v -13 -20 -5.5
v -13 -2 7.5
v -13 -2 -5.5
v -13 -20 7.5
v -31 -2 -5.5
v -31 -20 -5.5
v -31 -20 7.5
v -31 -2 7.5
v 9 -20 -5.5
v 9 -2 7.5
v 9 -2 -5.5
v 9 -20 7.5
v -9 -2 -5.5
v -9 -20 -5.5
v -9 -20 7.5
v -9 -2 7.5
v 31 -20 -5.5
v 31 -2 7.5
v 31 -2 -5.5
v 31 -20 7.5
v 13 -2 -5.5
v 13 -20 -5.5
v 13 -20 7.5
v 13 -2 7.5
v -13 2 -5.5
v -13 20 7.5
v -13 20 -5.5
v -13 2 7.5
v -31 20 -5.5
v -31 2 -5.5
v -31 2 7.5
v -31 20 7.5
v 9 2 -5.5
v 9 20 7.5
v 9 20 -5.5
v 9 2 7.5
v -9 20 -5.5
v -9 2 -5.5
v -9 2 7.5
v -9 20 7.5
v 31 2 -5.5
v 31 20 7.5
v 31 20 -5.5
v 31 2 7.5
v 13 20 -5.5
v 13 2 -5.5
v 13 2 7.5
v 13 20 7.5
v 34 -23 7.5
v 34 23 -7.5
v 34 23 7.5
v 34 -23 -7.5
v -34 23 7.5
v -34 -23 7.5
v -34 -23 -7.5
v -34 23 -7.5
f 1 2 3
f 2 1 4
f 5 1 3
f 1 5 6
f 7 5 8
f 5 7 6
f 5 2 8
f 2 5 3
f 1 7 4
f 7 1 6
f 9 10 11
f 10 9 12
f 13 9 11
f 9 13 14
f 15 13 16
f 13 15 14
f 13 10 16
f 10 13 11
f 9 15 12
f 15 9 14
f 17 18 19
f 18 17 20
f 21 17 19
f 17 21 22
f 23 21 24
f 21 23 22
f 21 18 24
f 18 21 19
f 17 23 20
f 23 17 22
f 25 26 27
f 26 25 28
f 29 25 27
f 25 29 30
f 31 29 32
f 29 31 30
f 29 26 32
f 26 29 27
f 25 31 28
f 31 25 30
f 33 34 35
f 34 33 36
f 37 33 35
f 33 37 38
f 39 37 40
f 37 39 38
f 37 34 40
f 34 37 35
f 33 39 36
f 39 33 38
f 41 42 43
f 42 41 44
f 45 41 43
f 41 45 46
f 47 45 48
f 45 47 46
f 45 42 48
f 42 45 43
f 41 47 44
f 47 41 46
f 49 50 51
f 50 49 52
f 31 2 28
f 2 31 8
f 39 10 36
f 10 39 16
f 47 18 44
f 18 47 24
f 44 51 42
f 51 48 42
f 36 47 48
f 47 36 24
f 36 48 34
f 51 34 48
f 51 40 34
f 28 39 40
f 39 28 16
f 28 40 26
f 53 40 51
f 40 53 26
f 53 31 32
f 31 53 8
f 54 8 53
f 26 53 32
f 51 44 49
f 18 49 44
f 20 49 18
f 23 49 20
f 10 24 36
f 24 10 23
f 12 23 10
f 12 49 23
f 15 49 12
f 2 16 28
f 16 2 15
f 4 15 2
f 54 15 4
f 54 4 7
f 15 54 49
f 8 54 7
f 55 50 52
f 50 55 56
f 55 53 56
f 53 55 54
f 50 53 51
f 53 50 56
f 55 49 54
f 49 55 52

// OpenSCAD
$fn = 32;

// ----------------------------------------------------------------------
// Pocket plate 68 x 46 x 15
// 2 x 3 pockets 18 mm square, 13 mm deep
// ----------------------------------------------------------------------

// --- parameters (mm) ---
thickness = 15;  // plate thickness
floor_t = 2;     // material left under each pocket
pocket = 18;     // pocket side length
pitch_x = 22;    // pocket pitch along X
pitch_y = 22;    // pocket pitch along Y
cols = 3;        // pockets per row
rows = 2;        // rows of pockets

// --- derived feature positions (mm) ---
depth = thickness - floor_t;        // = 13   pocket depth, down to the floor
span_x = (cols - 1) * pitch_x;      // = 44   distance between outer pockets
span_y = (rows - 1) * pitch_y;      // = 22   distance between outer pocket rows
origin_x = -span_x / 2;             // = -22   X of the first pocket
origin_y = -span_y / 2;             // = -11   Y of the first pocket
plate = [span_x + pocket + 6, span_y + pocket + 6, thickness];  // = [68, 46, 15]   overall size: pockets plus 3 mm of wall on each side
feature_centers = [
  [origin_x + 0 * pitch_x, origin_y + 0 * pitch_y],
  [origin_x + 1 * pitch_x, origin_y + 0 * pitch_y],
  [origin_x + 2 * pitch_x, origin_y + 0 * pitch_y],
  [origin_x + 0 * pitch_x, origin_y + 1 * pitch_y],
  [origin_x + 1 * pitch_x, origin_y + 1 * pitch_y],
  [origin_x + 2 * pitch_x, origin_y + 1 * pitch_y]
];   // pocket centres, used verbatim by the cutter loop

// plate outline, then one pocket per centre in feature_centers
difference() {
  cube(plate, center = true);
  for (centre = feature_centers)
    translate([centre[0] - pocket / 2, centre[1] - pocket / 2, plate[2] / 2 - depth])
      cube([pocket, pocket, depth + 1]);  // centred on the declared pocket centre
}
